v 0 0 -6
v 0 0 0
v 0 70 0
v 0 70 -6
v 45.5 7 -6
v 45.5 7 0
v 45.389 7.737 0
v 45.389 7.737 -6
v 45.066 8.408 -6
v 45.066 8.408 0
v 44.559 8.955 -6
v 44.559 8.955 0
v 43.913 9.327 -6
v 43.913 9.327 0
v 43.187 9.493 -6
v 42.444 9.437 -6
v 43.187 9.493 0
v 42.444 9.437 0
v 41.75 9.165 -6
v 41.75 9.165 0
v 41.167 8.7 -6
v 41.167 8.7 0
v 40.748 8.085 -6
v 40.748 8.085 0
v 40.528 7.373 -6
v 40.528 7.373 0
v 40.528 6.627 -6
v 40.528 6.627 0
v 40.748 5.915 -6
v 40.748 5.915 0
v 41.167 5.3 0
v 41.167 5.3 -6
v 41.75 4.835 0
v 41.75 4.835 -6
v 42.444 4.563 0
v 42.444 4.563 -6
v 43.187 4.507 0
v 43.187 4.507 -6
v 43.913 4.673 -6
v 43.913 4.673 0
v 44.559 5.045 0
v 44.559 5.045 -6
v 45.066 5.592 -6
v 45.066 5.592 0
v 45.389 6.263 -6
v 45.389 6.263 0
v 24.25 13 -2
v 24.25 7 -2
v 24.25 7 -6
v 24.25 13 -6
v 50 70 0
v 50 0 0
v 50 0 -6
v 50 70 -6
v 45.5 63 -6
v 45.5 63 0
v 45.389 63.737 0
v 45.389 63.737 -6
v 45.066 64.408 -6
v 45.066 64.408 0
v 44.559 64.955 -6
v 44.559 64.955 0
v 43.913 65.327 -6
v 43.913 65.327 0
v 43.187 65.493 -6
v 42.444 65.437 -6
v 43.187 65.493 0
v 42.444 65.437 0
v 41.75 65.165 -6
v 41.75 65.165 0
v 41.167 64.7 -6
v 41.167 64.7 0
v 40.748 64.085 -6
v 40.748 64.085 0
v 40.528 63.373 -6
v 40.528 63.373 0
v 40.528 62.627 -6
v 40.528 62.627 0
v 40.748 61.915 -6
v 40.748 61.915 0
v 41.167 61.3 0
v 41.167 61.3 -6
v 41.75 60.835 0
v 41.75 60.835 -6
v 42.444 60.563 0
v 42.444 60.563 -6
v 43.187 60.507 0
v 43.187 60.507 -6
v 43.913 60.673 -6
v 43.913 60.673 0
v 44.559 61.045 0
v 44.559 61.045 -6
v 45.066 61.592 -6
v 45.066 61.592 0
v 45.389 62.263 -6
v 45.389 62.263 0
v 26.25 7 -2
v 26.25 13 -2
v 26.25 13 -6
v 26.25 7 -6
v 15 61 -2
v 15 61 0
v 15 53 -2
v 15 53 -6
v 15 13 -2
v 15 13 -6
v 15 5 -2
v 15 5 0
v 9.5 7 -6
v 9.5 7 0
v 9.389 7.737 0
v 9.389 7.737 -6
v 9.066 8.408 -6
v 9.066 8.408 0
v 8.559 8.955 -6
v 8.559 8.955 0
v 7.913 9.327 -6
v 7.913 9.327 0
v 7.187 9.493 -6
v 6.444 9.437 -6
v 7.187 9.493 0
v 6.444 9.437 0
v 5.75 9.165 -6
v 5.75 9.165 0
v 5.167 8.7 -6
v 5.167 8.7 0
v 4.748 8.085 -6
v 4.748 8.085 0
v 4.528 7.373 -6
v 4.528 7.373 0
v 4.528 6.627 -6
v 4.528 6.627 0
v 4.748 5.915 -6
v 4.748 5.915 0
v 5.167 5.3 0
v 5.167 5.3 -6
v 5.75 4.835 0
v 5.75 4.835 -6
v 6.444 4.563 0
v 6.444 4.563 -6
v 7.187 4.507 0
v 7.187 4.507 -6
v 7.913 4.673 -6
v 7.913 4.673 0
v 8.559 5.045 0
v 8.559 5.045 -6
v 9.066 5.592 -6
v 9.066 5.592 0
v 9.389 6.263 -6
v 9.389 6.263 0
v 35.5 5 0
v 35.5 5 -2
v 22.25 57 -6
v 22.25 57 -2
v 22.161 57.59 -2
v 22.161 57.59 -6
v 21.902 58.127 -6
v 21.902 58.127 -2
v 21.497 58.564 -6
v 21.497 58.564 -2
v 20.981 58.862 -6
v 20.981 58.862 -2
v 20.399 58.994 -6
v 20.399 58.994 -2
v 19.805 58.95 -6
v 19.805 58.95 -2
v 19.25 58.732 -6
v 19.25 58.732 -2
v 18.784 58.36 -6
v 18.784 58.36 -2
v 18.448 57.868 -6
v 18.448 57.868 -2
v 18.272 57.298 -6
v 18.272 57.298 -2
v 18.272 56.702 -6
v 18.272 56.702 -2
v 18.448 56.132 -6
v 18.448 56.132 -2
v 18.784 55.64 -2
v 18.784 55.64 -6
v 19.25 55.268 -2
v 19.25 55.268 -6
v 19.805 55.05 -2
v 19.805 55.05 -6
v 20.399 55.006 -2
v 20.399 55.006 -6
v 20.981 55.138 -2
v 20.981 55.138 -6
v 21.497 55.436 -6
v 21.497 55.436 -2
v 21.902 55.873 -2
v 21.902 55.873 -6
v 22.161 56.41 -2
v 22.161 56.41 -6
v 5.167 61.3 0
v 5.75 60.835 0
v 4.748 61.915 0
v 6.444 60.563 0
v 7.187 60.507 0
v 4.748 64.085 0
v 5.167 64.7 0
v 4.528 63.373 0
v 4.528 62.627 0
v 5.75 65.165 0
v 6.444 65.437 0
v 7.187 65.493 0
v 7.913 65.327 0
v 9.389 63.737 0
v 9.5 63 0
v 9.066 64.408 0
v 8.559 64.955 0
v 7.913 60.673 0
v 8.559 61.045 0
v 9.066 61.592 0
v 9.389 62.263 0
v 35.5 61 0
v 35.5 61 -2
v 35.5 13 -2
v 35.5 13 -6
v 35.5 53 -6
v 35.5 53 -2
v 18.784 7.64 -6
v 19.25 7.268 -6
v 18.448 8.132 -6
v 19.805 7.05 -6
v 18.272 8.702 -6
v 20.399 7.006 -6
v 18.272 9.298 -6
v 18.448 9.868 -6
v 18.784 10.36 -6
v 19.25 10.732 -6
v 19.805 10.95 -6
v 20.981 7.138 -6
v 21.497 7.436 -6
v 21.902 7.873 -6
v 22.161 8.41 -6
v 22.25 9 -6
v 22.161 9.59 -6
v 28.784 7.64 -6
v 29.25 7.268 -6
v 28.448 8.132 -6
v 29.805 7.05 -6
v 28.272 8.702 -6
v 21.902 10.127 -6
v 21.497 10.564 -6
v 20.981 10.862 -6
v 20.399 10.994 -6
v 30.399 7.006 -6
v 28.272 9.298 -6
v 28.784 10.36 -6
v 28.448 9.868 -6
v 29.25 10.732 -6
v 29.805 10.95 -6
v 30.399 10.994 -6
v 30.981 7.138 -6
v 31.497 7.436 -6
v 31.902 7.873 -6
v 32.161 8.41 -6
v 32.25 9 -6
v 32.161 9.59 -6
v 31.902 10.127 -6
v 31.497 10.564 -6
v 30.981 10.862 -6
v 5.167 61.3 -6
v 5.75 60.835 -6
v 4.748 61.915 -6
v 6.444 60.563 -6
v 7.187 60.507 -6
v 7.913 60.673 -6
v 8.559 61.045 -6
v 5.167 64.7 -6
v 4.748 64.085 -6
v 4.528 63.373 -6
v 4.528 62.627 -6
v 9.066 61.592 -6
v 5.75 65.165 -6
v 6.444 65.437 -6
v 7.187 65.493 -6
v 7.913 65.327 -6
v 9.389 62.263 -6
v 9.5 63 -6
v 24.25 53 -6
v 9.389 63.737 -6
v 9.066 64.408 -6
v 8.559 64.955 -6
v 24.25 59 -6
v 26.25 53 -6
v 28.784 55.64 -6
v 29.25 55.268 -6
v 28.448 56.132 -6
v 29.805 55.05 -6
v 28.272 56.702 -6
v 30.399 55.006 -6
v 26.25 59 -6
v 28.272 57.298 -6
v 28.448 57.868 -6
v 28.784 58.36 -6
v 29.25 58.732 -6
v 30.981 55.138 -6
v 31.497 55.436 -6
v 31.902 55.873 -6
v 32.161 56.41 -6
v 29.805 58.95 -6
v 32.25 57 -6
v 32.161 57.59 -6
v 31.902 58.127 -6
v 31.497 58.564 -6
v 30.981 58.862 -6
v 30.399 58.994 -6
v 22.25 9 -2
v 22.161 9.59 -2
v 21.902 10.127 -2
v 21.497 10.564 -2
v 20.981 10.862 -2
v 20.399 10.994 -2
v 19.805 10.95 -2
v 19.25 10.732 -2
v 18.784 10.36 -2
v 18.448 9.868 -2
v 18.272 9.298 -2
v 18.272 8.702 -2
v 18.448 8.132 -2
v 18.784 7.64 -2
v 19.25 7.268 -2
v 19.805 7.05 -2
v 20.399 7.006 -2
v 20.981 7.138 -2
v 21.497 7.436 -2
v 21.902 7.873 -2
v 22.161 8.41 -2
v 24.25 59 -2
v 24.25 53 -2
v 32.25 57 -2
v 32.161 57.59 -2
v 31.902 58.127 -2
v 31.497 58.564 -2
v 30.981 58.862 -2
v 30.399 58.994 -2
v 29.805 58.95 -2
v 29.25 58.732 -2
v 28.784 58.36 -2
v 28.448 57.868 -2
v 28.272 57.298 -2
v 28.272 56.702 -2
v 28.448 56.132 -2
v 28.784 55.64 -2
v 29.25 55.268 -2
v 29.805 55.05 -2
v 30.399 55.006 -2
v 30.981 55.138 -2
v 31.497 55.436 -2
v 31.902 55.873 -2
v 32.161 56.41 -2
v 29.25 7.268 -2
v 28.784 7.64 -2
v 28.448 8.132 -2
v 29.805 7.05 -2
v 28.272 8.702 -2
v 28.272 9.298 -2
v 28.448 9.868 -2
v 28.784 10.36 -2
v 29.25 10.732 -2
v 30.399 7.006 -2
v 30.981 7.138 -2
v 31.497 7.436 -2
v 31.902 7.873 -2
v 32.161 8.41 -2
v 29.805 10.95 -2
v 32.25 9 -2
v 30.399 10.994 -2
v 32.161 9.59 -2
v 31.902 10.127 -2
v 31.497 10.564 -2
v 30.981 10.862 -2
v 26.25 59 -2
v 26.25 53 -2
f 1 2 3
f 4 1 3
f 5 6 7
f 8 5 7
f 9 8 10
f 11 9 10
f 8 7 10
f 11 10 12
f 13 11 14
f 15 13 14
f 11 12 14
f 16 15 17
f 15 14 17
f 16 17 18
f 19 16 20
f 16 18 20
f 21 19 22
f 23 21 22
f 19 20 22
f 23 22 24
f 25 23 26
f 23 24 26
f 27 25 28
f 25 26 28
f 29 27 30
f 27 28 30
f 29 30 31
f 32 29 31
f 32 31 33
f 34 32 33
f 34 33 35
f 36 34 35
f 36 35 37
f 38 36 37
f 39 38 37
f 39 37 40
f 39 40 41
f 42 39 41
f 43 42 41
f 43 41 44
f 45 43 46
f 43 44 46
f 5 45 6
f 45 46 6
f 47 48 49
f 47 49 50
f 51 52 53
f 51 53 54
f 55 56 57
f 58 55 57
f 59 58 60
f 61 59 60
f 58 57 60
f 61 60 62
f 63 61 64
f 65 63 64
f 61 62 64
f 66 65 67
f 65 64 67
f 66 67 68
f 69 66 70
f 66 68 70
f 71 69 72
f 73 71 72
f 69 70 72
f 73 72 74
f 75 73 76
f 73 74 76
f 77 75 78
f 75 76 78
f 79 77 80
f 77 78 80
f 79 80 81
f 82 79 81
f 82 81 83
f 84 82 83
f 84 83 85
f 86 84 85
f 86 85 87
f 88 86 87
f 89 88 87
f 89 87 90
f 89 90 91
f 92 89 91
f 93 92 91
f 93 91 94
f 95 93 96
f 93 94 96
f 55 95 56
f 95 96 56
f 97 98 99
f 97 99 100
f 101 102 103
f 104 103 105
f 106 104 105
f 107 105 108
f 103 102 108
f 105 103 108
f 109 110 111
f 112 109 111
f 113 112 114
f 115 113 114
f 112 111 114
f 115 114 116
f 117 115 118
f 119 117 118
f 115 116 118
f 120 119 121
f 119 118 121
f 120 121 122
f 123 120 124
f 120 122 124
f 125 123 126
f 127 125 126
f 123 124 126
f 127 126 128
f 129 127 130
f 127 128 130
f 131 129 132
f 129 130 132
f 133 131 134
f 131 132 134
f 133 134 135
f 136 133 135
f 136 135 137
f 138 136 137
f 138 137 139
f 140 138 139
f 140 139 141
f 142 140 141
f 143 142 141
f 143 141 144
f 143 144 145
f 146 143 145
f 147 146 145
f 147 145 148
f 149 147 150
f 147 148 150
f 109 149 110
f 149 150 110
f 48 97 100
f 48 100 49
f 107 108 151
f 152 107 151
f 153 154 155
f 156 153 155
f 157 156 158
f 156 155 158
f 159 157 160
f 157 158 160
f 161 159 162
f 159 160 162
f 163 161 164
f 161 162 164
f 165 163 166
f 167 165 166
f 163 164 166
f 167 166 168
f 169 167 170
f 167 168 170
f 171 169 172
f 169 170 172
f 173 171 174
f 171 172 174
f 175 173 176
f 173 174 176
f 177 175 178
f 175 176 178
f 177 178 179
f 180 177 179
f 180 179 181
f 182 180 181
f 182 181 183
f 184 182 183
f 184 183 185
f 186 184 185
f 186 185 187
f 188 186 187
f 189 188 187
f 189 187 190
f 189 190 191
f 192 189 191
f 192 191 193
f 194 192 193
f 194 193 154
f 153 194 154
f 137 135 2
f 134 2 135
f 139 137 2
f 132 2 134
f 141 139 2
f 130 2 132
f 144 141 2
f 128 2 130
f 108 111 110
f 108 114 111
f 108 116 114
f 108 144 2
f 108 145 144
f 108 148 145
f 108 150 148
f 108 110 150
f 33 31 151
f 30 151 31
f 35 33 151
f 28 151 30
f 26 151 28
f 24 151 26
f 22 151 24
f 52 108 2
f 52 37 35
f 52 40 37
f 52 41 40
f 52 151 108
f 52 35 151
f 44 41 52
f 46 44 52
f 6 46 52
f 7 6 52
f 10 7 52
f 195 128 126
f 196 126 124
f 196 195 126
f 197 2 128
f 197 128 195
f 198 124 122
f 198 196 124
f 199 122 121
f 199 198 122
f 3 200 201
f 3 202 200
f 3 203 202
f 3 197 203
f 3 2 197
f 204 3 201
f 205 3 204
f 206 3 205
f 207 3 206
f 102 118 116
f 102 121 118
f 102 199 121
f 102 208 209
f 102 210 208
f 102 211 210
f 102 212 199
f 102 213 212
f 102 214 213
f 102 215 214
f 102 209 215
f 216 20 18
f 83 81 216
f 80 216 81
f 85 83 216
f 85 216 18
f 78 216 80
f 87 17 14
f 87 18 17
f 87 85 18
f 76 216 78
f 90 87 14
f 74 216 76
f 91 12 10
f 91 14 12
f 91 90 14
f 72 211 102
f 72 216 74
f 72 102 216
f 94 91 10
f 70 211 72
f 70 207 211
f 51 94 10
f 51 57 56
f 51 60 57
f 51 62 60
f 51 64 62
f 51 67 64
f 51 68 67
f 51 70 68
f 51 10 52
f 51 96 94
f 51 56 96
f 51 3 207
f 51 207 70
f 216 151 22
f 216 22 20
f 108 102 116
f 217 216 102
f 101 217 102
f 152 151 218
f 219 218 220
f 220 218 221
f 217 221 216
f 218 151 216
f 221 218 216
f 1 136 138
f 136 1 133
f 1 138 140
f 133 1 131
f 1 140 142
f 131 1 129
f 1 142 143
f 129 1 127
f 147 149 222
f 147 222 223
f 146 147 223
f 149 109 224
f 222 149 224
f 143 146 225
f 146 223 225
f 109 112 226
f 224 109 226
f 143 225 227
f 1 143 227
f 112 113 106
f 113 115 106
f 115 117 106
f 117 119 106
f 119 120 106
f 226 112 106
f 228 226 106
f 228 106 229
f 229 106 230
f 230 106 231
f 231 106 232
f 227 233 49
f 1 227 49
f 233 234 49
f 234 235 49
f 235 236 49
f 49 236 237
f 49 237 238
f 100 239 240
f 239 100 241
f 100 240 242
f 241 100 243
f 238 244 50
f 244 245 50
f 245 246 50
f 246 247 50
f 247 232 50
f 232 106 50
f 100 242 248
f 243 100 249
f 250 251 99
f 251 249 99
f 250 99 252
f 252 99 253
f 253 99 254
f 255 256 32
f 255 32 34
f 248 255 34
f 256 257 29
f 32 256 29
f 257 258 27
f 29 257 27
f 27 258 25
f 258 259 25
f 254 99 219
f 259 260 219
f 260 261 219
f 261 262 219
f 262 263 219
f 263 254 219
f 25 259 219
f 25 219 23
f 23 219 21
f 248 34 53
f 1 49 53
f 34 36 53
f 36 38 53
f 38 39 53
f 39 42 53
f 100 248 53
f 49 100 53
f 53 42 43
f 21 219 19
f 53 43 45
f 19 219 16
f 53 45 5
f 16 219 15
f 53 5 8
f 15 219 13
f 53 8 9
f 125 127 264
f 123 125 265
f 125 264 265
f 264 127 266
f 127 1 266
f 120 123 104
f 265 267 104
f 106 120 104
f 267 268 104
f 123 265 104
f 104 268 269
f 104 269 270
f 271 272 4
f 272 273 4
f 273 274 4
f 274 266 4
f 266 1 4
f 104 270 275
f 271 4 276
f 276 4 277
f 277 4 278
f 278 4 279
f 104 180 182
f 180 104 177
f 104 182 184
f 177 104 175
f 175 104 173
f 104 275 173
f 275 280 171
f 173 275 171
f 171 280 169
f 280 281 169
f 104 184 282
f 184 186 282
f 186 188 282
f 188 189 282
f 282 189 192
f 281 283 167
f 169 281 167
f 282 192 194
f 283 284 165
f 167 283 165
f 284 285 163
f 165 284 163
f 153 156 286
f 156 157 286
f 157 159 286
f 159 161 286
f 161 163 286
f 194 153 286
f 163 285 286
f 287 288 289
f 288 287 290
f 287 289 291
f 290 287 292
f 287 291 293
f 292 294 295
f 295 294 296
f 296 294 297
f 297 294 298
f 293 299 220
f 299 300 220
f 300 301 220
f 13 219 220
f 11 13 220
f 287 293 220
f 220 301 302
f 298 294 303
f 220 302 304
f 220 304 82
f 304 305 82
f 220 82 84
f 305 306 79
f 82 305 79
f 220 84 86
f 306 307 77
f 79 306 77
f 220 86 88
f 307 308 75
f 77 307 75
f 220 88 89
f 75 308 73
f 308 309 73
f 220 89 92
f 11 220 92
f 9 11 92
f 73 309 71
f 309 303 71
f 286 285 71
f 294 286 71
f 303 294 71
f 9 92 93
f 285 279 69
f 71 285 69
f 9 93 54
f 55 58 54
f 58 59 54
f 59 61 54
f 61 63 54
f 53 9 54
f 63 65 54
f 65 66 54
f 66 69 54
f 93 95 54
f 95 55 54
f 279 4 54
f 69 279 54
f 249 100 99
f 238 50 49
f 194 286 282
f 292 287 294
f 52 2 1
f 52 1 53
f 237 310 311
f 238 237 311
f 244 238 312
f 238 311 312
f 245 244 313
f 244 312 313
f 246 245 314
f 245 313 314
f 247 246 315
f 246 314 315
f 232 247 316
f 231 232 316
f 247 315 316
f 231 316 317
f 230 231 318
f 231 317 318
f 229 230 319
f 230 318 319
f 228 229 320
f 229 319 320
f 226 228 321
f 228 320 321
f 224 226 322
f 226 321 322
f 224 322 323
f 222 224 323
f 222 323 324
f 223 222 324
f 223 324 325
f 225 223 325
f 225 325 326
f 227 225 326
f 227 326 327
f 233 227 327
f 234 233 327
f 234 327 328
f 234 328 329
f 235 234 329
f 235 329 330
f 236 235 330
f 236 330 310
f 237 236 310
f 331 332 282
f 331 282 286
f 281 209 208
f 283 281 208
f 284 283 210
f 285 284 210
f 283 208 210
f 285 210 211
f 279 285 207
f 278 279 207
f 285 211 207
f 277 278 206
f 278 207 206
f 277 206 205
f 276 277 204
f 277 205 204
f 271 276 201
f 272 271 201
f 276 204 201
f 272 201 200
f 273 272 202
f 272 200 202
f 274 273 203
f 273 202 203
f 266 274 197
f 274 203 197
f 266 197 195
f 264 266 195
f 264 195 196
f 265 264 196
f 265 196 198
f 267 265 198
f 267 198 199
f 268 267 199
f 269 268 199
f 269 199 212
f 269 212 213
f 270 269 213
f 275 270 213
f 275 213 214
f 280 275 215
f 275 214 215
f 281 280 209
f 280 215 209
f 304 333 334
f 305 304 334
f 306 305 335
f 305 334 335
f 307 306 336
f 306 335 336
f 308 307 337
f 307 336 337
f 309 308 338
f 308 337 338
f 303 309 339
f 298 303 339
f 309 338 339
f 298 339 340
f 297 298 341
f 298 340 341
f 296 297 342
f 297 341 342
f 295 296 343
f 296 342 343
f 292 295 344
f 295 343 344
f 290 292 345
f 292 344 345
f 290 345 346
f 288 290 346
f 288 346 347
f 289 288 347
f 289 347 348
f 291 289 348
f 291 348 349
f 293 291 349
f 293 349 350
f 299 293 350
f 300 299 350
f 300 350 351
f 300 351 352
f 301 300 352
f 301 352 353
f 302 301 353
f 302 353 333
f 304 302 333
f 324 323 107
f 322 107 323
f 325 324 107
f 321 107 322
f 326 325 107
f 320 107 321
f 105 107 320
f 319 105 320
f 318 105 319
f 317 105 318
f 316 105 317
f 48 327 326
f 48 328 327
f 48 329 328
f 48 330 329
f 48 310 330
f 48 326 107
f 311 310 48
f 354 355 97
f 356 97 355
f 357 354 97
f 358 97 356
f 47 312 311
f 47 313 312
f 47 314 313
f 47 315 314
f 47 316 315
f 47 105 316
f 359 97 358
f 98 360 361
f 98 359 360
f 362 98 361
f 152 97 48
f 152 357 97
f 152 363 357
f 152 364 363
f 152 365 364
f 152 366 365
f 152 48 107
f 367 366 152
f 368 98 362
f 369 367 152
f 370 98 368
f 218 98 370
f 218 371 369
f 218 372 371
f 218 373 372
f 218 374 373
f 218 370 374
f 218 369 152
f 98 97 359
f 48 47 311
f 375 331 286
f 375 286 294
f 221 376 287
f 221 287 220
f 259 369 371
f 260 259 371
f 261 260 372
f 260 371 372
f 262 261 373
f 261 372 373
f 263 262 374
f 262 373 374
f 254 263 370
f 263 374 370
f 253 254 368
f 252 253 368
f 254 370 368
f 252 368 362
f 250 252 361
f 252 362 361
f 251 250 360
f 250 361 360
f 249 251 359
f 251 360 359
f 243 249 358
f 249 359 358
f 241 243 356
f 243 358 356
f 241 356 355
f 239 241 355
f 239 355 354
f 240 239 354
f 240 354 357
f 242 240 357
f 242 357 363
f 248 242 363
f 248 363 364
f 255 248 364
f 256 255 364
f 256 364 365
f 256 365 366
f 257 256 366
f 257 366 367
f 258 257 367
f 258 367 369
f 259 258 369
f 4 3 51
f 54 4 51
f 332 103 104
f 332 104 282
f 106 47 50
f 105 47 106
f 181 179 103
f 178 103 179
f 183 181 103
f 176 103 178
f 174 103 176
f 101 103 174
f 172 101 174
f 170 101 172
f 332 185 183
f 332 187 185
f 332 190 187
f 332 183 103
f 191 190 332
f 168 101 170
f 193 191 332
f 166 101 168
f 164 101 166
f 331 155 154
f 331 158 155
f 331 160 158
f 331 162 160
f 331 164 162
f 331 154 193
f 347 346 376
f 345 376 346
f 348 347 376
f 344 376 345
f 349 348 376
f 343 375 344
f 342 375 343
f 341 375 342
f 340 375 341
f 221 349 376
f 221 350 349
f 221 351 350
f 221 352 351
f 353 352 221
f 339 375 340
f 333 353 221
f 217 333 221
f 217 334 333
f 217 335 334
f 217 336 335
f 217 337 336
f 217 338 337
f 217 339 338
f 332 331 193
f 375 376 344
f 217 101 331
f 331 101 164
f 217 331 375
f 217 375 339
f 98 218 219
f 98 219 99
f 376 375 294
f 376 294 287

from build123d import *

# Parameters (mm, degrees)
F0_W     = 50
F0_H     = 70
F0_R     = 2.5
F0_R_2   = 2
F1_DEPTH = 6
F2_DEPTH = 2


with BuildPart() as f1:
    # F0 (on Top) → F1 (new body)
    with BuildSketch(Plane.XY):
        with Locations((25, 35)):
            Rectangle(F0_W, F0_H)
        with Locations((7, 7)):
            Circle(F0_R, mode=Mode.SUBTRACT)
        with Locations((43, 7)):
            Circle(F0_R, mode=Mode.SUBTRACT)
        Polygon((35.5, 5), (15, 5), (15, 13), (15, 53), (15, 61), (35.5, 61), (35.5, 53), (35.5, 13), align=None, mode=Mode.SUBTRACT)
        with Locations((7, 63)):
            Circle(F0_R, mode=Mode.SUBTRACT)
        with Locations((43, 63)):
            Circle(F0_R, mode=Mode.SUBTRACT)
        Polygon((15, 61), (15, 53), (24.25, 53), (24.25, 59), (26.25, 59), (26.25, 53), (35.5, 53), (35.5, 61), align=None)
        with Locations((20.25, 57)):
            Circle(F0_R_2, mode=Mode.SUBTRACT)
        with Locations((30.25, 57)):
            Circle(F0_R_2, mode=Mode.SUBTRACT)
        Polygon((15, 13), (15, 5), (35.5, 5), (35.5, 13), (26.25, 13), (26.25, 7), (24.25, 7), (24.25, 13), align=None)
        with Locations((20.25, 9)):
            Circle(F0_R_2, mode=Mode.SUBTRACT)
        with Locations((30.25, 9)):
            Circle(F0_R_2, mode=Mode.SUBTRACT)
    extrude(amount=-F1_DEPTH)

    # F0 (on Top) → F2 (cut)
    with BuildSketch(Plane.XY):
        Polygon((15, 61), (15, 53), (24.25, 53), (24.25, 59), (26.25, 59), (26.25, 53), (35.5, 53), (35.5, 61), align=None)
        with Locations((20.25, 57)):
            Circle(F0_R_2, mode=Mode.SUBTRACT)
        with Locations((30.25, 57)):
            Circle(F0_R_2, mode=Mode.SUBTRACT)
        Polygon((15, 13), (15, 5), (35.5, 5), (35.5, 13), (26.25, 13), (26.25, 7), (24.25, 7), (24.25, 13), align=None)
        with Locations((20.25, 9)):
            Circle(F0_R_2, mode=Mode.SUBTRACT)
        with Locations((30.25, 9)):
            Circle(F0_R_2, mode=Mode.SUBTRACT)
    extrude(amount=-F2_DEPTH, mode=Mode.SUBTRACT)


solid = f1.part
